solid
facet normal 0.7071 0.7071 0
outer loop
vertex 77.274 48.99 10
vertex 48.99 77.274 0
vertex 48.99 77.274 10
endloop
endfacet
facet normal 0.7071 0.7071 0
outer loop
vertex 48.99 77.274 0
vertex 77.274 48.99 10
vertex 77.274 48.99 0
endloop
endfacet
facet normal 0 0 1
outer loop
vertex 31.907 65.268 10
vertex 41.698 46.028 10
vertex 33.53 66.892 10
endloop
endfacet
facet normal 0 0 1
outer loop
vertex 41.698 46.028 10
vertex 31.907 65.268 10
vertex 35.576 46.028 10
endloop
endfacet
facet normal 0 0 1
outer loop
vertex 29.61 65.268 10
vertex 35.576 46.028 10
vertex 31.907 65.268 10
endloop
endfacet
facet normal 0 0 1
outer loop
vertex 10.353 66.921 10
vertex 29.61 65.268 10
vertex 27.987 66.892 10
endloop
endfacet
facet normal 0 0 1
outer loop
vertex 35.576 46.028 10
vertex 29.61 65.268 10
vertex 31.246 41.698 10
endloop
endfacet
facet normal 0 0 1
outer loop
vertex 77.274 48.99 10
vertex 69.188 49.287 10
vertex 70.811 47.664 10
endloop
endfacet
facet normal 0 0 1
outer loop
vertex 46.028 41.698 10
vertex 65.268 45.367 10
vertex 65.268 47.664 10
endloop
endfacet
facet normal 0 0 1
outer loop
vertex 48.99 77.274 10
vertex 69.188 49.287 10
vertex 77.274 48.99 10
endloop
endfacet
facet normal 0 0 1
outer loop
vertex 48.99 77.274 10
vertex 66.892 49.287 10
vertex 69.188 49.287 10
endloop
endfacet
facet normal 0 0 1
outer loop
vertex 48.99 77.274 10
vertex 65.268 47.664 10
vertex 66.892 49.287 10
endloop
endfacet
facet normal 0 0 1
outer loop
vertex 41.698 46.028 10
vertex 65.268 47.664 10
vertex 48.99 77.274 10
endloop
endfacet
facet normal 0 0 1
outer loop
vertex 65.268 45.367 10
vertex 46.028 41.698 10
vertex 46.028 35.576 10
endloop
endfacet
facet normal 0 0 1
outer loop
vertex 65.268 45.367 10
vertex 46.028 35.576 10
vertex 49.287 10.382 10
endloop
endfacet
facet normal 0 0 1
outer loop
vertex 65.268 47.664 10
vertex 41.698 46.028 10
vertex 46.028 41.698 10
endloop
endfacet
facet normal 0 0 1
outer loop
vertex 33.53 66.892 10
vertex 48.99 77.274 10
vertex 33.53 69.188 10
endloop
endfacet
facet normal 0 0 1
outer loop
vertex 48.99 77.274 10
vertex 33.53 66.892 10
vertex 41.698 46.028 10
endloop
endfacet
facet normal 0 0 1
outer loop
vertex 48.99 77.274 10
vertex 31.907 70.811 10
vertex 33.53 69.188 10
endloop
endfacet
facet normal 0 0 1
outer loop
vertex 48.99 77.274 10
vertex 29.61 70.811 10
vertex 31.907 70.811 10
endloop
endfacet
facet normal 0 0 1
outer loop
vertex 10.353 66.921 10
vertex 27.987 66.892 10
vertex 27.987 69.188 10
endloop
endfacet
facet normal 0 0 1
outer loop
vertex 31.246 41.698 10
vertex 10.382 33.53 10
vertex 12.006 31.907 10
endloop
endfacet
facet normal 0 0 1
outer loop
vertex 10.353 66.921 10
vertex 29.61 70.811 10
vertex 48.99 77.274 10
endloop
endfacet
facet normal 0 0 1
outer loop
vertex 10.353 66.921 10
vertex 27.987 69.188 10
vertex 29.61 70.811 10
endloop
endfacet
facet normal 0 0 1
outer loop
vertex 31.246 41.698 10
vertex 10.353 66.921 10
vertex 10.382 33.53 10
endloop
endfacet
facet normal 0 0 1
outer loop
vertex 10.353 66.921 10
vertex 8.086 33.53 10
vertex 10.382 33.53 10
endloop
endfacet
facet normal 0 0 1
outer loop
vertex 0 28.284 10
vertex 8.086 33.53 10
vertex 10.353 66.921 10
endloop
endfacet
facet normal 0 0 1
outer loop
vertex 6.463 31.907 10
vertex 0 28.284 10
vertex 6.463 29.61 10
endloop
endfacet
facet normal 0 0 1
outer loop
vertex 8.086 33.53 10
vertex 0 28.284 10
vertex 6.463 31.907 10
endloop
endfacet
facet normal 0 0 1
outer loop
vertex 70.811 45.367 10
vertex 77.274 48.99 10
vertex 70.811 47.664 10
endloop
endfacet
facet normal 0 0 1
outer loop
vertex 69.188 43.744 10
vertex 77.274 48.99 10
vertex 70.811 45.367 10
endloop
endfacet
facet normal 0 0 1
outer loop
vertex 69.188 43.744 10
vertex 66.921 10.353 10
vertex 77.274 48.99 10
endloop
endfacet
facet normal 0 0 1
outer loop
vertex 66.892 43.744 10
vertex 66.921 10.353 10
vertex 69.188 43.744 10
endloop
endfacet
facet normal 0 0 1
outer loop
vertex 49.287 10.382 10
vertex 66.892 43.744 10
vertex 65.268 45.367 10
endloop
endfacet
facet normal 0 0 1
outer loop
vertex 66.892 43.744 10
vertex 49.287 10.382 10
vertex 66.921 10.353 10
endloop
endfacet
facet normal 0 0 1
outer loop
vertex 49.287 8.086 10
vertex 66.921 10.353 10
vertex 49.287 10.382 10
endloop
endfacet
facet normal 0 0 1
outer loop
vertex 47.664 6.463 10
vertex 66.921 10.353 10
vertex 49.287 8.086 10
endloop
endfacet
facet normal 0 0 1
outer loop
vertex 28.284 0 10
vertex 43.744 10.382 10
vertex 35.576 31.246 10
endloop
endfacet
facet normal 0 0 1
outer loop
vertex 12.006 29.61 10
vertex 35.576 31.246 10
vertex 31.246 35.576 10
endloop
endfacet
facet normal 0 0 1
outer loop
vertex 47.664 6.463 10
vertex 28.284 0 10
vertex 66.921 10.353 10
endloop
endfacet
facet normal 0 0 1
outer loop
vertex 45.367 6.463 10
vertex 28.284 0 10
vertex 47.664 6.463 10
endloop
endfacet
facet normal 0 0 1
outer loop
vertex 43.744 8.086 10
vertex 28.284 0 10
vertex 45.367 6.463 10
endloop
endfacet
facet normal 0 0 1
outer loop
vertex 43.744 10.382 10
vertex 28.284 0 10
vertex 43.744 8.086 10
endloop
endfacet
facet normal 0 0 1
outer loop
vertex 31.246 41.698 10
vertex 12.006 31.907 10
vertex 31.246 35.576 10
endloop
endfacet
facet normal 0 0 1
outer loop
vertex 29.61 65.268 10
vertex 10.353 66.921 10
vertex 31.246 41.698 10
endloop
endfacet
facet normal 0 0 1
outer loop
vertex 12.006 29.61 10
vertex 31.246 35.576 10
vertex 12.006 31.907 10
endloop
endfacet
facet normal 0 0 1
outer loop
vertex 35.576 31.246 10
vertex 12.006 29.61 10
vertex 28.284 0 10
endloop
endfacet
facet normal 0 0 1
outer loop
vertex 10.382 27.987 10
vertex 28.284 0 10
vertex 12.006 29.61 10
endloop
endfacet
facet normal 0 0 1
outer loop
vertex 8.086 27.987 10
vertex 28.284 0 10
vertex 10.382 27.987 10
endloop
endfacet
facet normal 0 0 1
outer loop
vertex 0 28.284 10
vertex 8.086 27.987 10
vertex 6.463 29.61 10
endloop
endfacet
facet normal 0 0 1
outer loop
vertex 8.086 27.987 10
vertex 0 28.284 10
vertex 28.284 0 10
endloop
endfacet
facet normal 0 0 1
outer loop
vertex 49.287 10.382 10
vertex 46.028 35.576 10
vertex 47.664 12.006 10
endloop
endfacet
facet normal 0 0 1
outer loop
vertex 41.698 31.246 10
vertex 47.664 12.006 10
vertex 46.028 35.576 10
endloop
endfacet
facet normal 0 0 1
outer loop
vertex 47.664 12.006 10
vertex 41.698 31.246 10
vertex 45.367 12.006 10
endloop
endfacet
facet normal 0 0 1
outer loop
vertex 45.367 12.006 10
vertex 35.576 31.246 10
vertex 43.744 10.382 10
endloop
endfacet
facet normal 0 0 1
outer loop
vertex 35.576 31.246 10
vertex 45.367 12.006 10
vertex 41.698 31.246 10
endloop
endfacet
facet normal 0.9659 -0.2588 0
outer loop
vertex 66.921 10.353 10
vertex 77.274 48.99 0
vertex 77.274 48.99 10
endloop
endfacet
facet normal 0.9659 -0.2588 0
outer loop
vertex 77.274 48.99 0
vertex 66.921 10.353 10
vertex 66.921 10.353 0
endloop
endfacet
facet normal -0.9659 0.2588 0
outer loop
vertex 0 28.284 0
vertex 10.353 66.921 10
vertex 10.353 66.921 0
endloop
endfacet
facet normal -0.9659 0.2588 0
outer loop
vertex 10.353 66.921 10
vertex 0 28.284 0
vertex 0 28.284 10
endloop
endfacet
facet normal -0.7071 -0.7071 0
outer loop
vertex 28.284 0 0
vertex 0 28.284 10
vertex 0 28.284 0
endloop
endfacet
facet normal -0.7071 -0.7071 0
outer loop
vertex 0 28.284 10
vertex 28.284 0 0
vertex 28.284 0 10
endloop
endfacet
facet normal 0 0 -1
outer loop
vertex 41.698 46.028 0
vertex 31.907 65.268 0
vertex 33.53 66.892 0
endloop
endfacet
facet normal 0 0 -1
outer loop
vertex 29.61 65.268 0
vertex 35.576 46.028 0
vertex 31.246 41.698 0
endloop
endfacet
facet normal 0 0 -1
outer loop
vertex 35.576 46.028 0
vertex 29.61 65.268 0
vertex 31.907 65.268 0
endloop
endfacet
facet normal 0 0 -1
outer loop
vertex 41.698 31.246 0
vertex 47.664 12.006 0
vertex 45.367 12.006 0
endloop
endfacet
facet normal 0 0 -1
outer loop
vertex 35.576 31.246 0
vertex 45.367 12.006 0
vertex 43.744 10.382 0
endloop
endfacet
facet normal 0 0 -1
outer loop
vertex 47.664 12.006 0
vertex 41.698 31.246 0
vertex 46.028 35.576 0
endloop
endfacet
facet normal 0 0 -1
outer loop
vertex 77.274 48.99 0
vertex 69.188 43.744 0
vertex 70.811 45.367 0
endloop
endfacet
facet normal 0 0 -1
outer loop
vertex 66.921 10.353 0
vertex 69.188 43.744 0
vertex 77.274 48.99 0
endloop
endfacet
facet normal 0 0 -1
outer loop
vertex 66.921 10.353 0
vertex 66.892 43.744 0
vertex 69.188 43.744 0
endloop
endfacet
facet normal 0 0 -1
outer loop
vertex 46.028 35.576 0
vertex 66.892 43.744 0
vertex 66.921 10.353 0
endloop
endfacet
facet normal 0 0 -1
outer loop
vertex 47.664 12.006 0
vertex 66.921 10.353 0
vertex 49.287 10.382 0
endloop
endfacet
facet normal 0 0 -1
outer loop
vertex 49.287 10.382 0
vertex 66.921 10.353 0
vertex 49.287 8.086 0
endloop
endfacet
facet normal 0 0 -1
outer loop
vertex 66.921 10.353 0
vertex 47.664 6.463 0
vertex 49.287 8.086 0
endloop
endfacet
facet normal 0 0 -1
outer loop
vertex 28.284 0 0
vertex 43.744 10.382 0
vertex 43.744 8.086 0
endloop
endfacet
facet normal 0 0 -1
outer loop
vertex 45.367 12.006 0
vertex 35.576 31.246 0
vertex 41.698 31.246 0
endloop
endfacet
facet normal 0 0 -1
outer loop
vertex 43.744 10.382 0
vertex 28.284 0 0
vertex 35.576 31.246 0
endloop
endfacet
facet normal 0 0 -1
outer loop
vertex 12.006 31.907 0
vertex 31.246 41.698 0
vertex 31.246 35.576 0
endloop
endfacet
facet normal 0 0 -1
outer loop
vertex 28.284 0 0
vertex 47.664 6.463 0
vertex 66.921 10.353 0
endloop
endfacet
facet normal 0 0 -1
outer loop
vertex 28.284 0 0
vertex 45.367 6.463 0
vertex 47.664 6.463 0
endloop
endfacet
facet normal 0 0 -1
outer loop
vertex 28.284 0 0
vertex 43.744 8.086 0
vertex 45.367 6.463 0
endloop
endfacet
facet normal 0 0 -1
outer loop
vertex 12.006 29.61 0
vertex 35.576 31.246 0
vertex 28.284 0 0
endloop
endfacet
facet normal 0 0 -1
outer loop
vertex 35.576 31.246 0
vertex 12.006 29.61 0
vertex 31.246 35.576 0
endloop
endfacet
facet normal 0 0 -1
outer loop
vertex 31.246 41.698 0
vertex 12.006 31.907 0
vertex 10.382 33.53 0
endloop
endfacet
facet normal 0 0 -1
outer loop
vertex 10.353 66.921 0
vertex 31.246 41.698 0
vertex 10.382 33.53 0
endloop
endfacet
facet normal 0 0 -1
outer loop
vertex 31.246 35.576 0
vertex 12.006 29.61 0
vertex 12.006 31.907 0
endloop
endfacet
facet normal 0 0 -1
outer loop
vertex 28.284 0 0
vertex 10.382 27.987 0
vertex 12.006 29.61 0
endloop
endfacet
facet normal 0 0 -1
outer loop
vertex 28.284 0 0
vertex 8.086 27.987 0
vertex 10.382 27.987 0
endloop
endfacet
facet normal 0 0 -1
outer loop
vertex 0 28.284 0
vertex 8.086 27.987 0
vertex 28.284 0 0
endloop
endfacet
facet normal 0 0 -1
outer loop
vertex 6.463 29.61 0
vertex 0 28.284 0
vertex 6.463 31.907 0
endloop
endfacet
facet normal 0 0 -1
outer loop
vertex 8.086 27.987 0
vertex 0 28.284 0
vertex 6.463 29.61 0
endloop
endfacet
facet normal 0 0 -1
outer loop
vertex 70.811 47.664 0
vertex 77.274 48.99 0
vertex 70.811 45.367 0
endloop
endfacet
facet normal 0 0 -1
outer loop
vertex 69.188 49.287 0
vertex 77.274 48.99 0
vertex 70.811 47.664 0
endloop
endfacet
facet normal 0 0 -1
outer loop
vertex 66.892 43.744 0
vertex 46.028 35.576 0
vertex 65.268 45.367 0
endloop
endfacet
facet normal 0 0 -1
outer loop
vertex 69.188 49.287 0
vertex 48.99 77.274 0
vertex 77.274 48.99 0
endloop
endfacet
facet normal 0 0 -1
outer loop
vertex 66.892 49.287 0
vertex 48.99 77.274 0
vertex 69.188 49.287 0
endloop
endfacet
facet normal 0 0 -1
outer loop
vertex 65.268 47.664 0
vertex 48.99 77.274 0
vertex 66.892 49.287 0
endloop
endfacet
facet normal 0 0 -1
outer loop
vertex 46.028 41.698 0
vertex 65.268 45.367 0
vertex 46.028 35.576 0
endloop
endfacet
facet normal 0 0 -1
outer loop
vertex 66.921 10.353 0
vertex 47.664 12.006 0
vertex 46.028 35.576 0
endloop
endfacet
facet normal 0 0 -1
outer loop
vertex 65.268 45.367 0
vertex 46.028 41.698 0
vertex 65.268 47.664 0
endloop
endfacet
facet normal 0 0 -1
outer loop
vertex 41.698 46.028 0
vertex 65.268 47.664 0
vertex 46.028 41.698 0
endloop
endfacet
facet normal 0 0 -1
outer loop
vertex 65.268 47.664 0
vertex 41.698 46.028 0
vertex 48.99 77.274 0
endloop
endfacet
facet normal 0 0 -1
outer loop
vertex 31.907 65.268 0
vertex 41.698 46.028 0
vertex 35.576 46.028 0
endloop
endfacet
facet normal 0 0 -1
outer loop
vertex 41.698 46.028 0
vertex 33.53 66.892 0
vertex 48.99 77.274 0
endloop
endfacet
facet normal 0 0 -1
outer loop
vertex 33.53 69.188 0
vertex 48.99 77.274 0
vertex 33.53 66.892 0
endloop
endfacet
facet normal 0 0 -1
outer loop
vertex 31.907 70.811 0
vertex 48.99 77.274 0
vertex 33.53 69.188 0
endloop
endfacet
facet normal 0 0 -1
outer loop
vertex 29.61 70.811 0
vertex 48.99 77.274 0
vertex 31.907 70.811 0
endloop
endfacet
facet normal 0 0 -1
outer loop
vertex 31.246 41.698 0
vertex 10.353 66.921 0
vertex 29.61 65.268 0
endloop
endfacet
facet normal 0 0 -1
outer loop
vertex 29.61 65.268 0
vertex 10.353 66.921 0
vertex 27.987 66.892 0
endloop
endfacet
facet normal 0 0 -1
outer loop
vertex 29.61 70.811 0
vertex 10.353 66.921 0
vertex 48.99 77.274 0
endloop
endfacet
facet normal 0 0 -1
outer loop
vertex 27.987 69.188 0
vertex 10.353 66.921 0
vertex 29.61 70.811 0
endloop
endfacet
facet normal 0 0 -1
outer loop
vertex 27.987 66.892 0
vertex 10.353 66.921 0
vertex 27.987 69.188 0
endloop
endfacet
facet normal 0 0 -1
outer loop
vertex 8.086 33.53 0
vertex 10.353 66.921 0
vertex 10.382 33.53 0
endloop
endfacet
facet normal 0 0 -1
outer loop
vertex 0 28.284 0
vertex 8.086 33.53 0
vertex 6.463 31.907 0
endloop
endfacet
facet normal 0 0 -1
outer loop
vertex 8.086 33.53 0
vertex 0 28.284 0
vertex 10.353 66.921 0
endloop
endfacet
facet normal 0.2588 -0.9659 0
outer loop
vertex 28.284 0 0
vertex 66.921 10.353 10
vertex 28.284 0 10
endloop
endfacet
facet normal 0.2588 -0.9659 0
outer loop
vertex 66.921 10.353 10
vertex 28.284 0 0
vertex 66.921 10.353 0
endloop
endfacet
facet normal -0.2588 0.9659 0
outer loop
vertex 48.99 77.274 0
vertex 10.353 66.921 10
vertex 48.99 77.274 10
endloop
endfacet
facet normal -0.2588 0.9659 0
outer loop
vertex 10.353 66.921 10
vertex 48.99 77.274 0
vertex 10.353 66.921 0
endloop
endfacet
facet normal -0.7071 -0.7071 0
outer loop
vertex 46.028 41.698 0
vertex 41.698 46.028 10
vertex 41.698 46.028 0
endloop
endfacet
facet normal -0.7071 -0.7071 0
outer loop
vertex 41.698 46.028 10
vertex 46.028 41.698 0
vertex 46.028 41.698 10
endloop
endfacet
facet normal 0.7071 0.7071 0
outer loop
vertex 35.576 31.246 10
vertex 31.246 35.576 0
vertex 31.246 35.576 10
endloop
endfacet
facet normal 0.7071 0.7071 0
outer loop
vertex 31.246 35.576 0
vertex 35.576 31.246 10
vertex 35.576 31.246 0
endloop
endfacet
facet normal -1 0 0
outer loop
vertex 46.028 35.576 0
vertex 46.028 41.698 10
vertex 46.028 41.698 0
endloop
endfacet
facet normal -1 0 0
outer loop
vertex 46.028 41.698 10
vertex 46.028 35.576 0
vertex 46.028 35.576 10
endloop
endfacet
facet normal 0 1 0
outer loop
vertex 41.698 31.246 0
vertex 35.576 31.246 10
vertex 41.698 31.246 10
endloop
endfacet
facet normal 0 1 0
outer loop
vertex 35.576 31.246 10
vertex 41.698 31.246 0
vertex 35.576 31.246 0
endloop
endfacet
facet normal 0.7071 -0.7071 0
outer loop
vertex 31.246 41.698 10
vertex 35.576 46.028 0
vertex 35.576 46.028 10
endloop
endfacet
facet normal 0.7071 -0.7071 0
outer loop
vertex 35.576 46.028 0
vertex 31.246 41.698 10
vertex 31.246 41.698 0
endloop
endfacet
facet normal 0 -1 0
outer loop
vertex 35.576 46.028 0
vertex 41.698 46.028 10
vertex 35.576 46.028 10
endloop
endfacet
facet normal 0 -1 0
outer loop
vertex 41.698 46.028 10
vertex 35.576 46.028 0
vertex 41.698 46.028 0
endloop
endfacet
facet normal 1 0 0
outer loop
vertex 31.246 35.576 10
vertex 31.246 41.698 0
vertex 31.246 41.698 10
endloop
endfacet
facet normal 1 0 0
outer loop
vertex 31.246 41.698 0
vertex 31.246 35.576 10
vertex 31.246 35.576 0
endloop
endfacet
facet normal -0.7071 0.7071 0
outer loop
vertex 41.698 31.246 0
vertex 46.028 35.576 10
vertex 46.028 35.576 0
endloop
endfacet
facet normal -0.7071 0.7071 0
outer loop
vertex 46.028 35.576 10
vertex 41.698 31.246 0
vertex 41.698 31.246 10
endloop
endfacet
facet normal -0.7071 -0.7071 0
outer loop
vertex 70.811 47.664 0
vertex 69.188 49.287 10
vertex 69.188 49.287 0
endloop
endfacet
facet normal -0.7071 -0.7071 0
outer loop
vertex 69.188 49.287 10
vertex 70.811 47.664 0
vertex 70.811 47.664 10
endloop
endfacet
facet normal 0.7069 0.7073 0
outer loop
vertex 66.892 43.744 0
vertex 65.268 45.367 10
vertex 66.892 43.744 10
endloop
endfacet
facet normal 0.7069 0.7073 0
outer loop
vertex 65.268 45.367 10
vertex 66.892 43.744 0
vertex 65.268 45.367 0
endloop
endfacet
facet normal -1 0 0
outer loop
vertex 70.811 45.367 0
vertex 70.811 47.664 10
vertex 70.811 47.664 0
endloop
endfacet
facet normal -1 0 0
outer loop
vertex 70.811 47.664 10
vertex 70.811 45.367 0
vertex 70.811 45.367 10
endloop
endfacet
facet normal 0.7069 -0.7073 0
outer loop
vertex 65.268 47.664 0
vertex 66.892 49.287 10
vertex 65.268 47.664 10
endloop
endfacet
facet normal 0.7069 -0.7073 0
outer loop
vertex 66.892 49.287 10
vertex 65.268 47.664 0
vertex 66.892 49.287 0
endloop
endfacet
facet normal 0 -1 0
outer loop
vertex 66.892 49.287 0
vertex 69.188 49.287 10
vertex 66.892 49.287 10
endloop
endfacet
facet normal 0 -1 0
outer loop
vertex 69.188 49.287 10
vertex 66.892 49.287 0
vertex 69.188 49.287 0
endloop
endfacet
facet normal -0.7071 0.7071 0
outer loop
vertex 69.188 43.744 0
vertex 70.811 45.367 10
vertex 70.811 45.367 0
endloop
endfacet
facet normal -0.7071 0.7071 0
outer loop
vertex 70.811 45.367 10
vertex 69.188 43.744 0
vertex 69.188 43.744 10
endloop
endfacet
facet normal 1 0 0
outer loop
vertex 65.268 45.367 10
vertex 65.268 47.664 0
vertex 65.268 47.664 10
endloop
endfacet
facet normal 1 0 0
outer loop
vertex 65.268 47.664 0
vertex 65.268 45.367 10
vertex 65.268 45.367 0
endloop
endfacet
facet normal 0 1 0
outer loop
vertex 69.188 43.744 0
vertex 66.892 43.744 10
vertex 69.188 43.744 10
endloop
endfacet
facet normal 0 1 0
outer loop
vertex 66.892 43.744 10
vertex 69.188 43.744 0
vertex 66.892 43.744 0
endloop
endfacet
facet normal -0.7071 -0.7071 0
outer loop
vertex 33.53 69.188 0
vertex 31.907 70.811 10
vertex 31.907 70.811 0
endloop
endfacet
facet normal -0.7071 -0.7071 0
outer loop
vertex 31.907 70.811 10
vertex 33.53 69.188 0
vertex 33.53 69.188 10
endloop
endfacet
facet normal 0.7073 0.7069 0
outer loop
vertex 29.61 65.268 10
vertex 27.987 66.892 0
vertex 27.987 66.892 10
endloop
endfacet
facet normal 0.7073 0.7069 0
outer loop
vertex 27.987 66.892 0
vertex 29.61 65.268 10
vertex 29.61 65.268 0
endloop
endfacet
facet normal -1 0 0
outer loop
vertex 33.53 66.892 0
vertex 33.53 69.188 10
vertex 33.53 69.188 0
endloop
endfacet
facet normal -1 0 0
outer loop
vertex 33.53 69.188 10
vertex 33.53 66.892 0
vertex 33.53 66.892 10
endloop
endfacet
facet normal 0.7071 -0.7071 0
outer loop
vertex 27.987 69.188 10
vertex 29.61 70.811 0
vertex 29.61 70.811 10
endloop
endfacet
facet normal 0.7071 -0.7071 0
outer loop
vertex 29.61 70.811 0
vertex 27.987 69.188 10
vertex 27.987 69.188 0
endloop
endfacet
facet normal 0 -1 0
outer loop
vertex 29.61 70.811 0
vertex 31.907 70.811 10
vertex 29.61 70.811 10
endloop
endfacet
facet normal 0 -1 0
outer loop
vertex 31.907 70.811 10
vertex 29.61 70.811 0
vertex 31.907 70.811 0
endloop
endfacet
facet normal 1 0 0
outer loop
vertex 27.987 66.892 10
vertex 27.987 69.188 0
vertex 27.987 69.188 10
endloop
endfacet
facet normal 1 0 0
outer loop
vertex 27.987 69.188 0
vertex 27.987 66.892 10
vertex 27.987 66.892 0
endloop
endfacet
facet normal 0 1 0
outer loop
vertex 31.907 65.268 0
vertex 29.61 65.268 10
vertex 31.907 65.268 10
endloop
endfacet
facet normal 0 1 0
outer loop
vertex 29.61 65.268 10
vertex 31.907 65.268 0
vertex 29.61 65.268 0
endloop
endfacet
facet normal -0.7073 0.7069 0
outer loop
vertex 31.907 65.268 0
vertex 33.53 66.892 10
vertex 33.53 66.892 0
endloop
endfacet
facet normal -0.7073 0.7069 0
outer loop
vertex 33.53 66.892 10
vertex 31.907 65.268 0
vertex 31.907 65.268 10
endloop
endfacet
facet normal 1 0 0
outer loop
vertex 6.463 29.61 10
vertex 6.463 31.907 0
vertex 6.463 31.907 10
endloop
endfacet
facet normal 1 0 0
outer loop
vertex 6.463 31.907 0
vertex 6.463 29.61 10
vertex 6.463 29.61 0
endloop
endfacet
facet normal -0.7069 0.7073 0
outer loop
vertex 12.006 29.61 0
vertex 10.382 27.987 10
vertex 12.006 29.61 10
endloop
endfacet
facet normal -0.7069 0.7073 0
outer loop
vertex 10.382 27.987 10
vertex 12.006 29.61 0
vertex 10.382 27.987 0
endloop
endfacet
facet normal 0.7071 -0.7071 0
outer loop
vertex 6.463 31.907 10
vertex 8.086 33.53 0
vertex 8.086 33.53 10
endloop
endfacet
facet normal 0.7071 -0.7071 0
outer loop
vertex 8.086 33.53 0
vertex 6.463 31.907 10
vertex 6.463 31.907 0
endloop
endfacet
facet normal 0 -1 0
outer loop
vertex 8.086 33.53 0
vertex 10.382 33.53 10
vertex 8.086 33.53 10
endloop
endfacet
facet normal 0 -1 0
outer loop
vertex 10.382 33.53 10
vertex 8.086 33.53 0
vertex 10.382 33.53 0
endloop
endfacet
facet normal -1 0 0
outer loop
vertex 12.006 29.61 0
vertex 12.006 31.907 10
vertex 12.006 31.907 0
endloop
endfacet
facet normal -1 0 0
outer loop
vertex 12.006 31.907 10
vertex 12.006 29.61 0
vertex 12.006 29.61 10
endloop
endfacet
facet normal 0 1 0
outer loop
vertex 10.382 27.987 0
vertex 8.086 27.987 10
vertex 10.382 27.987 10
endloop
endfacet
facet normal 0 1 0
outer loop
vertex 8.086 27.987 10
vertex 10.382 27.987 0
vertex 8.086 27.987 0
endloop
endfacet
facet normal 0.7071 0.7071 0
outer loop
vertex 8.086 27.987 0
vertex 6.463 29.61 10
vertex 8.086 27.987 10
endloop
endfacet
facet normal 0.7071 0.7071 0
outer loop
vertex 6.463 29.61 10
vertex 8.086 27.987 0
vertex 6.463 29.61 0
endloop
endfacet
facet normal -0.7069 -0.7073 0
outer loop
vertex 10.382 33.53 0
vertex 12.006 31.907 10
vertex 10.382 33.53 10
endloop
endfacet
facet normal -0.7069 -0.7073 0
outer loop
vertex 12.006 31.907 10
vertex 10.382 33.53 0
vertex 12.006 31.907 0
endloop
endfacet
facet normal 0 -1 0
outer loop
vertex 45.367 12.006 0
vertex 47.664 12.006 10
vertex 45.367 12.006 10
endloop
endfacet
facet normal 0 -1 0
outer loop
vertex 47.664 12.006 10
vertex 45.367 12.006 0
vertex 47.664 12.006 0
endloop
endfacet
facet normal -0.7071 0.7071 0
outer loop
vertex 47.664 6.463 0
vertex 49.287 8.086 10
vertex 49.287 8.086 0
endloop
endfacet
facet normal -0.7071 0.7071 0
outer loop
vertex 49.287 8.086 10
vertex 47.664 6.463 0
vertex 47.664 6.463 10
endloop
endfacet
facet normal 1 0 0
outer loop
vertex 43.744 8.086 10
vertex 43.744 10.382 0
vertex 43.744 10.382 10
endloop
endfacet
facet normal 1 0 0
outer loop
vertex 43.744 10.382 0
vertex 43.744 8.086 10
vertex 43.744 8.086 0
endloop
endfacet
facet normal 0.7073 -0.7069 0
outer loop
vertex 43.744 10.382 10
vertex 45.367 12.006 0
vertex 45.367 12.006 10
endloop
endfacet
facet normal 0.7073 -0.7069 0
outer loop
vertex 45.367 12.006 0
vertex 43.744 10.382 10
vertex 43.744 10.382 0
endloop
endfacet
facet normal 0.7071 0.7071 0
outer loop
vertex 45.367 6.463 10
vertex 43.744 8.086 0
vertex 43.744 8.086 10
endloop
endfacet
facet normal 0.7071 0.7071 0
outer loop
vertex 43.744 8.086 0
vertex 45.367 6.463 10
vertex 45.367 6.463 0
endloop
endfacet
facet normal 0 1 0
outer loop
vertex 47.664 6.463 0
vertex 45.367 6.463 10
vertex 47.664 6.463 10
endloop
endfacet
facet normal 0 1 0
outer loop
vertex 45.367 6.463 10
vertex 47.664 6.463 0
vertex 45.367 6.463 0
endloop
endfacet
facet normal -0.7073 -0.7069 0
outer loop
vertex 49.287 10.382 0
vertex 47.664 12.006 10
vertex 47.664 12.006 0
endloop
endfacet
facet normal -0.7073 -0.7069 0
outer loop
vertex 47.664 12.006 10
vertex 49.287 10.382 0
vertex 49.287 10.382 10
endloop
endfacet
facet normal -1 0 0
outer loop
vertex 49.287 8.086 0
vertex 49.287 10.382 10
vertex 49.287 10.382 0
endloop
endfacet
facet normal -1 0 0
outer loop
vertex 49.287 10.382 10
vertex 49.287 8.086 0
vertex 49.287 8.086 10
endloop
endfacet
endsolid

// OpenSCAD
$fn = 32;

// ----------------------------------------------------------------------
// Polygon plate: 6-gon R40, 4 bolt windows
// ----------------------------------------------------------------------

// --- parameters (mm) ---
sides = 6;                // number of polygon sides
plate_r = 40;             // circumscribed radius of the polygon
bore_r = 8;               // centre bore radius
bolts = 4;                // number of bolt windows
ring_r = 30.44;           // bolt-circle radius
bolt_r = 3;               // bolt window radius
plate_t = 10;             // plate thickness, Z (extrusion height)

plate_d = 2 * plate_r;  // circumscribed diameter
bore_d = 2 * bore_r;  // centre bore diameter
bolt_d = 2 * bolt_r;  // bolt window diameter
ring_d = 2 * ring_r;  // bolt-circle diameter

profile = [[77.274, 48.99], [48.99, 77.274], [10.353, 66.921], [0, 28.284], [28.284, 0], [66.921, 10.353]];  // primary outline, 6 points, counter clockwise
void_1 = [[46.028, 41.698], [41.698, 46.028], [35.576, 46.028], [31.246, 41.698], [31.246, 35.576], [35.576, 31.246], [41.698, 31.246], [46.028, 35.576]];  // centre bore, 8 points
void_2 = [[70.811, 47.664], [69.188, 49.287], [66.892, 49.287], [65.268, 47.664], [65.268, 45.367], [66.892, 43.744], [69.188, 43.744], [70.811, 45.367]];  // bolt window 1, 8 points
void_3 = [[33.53, 69.188], [31.907, 70.811], [29.61, 70.811], [27.987, 69.188], [27.987, 66.892], [29.61, 65.268], [31.907, 65.268], [33.53, 66.892]];  // bolt window 2, 8 points
void_4 = [[12.006, 31.907], [10.382, 33.53], [8.086, 33.53], [6.463, 31.907], [6.463, 29.61], [8.086, 27.987], [10.382, 27.987], [12.006, 29.61]];  // bolt window 3, 8 points
void_5 = [[49.287, 10.382], [47.664, 12.006], [45.367, 12.006], [43.744, 10.382], [43.744, 8.086], [45.367, 6.463], [47.664, 6.463], [49.287, 8.086]];  // bolt window 4, 8 points

// --- the one profile operation ---
difference() {
  linear_extrude(height = plate_t) polygon(points = profile);
  translate([0, 0, -1])
    linear_extrude(height = plate_t + 2) polygon(points = void_1);
  translate([0, 0, -1])
    linear_extrude(height = plate_t + 2) polygon(points = void_2);
  translate([0, 0, -1])
    linear_extrude(height = plate_t + 2) polygon(points = void_3);
  translate([0, 0, -1])
    linear_extrude(height = plate_t + 2) polygon(points = void_4);
  translate([0, 0, -1])
    linear_extrude(height = plate_t + 2) polygon(points = void_5);
}
